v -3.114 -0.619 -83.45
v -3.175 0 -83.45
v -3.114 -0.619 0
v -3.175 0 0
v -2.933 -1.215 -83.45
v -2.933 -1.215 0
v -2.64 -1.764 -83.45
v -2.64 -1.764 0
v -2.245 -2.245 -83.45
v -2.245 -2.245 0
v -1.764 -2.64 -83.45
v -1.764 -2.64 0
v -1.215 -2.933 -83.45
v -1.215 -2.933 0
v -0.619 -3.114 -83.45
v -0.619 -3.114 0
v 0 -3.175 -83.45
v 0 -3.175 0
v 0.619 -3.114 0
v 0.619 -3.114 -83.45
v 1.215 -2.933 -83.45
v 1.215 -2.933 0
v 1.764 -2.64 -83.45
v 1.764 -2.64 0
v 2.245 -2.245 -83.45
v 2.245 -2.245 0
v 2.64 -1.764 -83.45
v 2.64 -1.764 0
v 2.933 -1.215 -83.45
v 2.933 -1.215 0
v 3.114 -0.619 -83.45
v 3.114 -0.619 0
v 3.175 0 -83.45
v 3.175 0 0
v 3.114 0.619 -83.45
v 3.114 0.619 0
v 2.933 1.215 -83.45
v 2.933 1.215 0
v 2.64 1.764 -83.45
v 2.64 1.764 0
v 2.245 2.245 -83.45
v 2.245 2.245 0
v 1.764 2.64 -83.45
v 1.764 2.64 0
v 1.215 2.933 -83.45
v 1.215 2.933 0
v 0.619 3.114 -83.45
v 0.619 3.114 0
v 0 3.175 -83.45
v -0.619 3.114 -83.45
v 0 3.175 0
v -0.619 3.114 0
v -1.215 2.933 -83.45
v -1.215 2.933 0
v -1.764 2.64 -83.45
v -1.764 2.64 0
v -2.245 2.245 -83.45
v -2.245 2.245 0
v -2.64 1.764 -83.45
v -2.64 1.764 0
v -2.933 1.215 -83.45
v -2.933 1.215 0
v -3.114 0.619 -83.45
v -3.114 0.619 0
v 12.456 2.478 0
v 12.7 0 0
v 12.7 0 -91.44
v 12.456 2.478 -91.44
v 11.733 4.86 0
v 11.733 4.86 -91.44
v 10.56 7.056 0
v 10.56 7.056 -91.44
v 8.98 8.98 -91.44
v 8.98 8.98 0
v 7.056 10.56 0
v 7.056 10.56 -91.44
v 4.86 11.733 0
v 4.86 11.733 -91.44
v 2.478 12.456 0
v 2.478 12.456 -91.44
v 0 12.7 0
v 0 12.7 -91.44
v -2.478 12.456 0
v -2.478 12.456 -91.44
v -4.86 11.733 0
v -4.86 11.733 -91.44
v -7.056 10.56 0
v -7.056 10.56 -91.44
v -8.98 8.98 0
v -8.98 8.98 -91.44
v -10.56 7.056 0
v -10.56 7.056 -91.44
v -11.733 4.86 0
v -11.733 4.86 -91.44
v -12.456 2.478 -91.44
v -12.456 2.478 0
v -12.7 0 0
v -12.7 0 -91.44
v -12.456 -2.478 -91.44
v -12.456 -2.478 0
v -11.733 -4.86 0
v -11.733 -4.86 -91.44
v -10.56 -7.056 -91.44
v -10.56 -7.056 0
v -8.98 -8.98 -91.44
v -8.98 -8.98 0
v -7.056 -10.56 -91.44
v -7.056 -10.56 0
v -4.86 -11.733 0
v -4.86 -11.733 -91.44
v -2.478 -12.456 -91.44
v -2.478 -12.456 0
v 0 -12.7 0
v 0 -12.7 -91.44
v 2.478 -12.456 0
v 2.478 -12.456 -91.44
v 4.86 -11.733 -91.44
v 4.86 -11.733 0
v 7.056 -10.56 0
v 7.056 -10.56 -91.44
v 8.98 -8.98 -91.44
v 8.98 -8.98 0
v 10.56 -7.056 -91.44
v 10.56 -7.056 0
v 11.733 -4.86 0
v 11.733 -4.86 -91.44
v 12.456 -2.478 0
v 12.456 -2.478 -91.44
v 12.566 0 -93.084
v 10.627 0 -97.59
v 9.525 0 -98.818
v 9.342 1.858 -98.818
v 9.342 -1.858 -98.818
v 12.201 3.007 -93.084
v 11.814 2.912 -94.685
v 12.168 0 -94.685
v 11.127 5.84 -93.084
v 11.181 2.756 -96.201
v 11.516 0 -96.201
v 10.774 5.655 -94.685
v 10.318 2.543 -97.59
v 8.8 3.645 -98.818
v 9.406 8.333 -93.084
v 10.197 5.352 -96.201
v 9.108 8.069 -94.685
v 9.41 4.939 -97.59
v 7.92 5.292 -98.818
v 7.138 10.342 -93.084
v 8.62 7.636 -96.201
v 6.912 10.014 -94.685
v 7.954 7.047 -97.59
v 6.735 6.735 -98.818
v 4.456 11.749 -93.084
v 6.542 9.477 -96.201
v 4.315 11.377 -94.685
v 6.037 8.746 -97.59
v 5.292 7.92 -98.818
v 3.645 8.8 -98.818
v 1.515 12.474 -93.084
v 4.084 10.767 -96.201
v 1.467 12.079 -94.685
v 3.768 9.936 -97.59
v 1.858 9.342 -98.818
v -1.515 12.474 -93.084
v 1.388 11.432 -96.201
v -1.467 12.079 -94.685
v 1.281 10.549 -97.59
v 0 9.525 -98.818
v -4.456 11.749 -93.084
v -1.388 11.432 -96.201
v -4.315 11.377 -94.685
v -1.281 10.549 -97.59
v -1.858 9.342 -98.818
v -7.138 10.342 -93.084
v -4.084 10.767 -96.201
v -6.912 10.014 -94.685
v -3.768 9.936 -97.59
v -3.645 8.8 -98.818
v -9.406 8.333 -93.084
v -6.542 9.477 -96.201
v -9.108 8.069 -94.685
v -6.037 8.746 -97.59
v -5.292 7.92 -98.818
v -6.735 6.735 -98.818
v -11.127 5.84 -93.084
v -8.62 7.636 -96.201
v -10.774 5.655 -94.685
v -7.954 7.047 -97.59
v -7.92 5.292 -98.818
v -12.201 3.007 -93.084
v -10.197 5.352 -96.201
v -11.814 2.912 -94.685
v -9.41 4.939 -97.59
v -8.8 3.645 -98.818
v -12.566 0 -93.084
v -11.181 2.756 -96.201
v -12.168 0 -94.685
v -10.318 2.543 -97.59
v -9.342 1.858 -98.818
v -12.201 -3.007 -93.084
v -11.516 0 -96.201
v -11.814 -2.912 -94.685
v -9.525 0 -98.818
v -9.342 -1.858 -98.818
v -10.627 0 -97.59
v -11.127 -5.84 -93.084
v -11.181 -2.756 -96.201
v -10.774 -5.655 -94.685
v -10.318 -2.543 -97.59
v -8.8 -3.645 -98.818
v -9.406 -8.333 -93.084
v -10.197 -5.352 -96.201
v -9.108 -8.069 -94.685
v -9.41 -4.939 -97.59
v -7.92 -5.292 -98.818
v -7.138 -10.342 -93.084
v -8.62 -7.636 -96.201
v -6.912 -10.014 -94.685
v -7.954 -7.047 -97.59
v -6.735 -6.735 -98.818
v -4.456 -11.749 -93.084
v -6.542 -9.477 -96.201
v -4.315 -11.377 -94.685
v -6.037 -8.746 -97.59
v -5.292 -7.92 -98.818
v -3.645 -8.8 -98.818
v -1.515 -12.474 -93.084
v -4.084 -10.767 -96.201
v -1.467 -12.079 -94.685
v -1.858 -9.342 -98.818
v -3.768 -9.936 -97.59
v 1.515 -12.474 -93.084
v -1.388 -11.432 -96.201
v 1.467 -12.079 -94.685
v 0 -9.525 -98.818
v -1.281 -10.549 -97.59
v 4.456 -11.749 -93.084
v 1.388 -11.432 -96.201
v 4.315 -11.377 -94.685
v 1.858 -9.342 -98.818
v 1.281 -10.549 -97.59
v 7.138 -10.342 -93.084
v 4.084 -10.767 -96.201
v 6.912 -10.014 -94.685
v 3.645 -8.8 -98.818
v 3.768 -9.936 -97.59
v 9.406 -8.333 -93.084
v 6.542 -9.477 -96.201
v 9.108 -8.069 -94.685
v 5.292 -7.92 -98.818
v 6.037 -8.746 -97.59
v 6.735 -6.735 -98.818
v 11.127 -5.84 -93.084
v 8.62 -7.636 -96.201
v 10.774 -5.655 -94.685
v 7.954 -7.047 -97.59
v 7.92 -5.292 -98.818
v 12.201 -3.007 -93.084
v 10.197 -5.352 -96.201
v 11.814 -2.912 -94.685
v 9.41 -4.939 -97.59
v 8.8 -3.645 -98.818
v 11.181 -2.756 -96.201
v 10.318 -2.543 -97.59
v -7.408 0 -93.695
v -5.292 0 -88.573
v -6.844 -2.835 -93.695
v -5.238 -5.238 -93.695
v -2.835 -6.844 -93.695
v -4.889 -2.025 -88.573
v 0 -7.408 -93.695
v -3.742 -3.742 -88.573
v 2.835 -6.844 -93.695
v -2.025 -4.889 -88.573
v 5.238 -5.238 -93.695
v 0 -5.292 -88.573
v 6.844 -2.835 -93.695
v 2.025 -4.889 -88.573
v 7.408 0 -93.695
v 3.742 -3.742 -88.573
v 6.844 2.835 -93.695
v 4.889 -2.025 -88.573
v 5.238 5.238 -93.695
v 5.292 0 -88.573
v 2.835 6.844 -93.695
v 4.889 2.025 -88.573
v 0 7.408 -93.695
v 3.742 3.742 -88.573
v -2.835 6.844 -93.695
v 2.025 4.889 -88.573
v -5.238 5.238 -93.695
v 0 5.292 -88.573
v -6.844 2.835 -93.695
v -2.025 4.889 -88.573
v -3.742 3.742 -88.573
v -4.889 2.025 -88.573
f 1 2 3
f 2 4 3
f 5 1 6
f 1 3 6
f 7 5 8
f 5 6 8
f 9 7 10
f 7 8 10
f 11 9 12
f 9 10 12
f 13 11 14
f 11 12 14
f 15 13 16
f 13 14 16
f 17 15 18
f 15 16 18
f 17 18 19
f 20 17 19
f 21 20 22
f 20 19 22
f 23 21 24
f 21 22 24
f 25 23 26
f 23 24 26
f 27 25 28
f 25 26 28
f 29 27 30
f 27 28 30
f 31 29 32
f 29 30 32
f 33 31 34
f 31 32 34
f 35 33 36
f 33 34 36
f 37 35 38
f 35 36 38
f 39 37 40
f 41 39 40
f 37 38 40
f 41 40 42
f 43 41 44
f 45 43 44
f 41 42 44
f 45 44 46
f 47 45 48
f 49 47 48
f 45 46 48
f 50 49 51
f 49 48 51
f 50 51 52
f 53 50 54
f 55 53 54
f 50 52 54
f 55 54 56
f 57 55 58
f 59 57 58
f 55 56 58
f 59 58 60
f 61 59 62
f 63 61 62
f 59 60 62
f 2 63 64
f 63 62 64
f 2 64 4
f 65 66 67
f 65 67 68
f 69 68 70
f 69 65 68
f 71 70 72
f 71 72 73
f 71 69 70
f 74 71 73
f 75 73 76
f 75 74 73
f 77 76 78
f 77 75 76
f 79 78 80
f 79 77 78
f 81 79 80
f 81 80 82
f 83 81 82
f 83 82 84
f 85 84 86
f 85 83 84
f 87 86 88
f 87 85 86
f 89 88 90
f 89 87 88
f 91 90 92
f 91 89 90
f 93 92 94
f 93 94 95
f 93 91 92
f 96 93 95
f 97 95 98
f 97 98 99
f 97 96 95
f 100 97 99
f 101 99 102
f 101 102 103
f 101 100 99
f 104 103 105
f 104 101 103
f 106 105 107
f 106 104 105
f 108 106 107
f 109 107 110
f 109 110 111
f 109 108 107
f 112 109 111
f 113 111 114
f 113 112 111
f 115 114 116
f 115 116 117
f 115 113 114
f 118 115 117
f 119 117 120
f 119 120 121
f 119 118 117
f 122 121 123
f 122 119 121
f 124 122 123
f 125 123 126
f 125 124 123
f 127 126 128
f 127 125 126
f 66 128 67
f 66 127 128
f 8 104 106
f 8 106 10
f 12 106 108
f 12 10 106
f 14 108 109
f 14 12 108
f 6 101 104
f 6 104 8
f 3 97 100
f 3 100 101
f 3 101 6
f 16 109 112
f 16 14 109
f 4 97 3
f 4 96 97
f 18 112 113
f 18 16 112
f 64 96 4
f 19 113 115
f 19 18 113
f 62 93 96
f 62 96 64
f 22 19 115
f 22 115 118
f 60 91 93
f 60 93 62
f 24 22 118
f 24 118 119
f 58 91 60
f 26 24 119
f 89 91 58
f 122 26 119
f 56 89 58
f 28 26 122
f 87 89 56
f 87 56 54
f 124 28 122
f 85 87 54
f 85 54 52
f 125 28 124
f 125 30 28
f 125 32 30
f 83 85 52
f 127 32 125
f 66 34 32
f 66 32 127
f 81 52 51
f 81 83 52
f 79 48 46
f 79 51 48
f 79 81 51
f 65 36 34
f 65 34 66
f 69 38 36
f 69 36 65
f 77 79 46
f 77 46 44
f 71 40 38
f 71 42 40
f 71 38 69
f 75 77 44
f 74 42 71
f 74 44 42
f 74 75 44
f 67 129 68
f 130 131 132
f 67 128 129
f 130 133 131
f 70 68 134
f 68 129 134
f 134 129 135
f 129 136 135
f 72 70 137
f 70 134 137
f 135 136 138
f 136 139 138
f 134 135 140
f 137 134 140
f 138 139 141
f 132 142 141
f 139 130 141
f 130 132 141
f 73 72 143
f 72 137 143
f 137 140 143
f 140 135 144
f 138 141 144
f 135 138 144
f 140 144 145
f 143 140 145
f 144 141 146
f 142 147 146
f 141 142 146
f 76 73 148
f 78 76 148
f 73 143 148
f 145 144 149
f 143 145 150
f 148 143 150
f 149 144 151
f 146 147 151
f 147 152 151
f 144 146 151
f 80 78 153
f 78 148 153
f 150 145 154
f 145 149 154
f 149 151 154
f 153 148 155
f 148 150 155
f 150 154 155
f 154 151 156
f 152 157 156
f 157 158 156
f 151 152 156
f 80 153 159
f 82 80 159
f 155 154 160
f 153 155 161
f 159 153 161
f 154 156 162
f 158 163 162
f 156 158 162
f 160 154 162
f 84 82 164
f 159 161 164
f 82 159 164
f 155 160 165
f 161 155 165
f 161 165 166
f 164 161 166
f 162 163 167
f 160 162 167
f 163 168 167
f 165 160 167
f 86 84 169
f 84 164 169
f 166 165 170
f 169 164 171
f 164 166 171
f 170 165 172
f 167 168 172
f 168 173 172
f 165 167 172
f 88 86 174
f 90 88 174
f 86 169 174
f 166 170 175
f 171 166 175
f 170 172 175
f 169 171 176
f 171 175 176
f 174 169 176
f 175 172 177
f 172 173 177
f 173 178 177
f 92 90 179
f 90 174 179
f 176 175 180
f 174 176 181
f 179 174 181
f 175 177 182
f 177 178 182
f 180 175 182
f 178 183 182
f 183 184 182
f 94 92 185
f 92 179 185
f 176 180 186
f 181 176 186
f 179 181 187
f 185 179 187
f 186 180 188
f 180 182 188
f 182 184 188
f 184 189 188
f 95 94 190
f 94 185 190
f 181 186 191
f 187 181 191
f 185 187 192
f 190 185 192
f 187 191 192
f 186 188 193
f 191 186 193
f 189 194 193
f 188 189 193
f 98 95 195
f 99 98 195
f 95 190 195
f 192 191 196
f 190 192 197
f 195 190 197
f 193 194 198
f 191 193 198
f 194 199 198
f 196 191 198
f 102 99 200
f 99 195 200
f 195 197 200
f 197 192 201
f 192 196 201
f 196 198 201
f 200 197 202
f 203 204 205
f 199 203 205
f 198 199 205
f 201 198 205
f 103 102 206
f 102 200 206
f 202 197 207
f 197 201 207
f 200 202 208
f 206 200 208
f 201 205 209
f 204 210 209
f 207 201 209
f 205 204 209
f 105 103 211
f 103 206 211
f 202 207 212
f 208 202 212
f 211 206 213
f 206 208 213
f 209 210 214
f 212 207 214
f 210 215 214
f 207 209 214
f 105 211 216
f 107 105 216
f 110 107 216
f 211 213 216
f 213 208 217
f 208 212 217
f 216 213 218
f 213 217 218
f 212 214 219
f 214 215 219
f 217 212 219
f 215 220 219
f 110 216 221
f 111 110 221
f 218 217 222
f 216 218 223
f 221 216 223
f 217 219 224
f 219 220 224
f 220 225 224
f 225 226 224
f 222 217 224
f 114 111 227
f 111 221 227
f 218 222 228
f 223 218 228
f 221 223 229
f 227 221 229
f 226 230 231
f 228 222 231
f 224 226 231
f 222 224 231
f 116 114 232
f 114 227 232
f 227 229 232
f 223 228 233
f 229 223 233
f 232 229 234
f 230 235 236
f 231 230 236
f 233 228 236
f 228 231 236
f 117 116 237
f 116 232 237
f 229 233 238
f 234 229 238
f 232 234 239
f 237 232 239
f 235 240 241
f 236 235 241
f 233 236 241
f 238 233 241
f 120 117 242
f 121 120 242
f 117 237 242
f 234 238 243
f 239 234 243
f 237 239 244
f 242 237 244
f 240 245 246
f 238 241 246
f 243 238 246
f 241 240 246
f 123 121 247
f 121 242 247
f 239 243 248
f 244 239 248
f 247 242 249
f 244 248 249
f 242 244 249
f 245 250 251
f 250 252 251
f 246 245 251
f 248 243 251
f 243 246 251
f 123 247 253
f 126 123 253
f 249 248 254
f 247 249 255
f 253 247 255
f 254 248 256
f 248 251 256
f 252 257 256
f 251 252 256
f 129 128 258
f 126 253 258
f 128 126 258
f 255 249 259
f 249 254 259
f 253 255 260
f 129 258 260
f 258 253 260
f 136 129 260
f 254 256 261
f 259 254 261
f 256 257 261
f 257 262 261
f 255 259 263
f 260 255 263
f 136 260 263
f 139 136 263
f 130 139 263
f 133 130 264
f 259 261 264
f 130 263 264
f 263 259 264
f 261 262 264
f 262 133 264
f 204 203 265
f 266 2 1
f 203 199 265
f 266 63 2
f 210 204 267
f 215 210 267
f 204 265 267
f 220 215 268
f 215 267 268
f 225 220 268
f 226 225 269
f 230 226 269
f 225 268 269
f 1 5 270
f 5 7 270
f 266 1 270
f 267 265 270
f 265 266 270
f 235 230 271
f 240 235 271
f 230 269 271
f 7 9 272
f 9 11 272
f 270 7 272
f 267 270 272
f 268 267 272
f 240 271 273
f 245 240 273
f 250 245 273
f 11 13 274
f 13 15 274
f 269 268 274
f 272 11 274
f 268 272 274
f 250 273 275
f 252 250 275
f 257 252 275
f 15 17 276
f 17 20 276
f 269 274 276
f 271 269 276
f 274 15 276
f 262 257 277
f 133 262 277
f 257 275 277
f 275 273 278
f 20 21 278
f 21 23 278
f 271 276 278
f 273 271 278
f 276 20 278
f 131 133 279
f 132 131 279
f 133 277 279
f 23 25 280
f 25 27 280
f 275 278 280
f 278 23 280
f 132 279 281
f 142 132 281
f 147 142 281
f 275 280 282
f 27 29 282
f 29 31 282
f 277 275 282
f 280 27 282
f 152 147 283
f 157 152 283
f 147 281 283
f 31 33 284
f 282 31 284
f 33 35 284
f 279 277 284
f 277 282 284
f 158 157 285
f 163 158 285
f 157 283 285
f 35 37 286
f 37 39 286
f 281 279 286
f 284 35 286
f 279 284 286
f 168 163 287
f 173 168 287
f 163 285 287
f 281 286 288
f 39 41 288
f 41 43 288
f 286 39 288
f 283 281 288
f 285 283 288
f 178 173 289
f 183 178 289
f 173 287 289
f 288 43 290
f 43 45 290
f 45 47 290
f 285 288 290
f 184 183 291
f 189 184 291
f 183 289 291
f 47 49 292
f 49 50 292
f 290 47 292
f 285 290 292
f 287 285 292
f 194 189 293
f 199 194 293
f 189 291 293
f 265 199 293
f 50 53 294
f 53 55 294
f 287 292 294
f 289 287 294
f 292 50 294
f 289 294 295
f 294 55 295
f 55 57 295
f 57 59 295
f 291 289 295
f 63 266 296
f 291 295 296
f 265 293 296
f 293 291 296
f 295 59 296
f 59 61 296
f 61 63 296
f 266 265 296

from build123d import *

# Parameters (mm, degrees)
F0_R           = 12.7
F1_DEPTH       = 101.6
F3_R           = 10.16
F4_D           = 6.35
F4_START       = 2.7819668
F4_CSINK_D     = 19.05
F4_CSINK_ANGLE = 44.9


with BuildPart() as f1:
    # F0 (on Top) → F1 (new body)
    with BuildSketch(Plane.XY):
        Circle(F0_R)
    extrude(amount=-F1_DEPTH)

    # F3
    f3_edges = [f1.edges().sort_by_distance(p)[0] for p in [
        (-12.7, 0, -101.6),
    ]]
    fillet(f3_edges, radius=F3_R)

    # F4 (through all)
    # its depths count from where the whole tool has entered the part; down to there all is cleared
    with Locations(Plane(origin=(0, 0, -101.6), x_dir=(1, 0, 0), z_dir=(0, 0, -1)).offset(-F4_START)):
        with Locations((0, 0)):
            CounterSinkHole(F4_D / 2, F4_CSINK_D / 2, counter_sink_angle=F4_CSINK_ANGLE)


solid = f1.part
